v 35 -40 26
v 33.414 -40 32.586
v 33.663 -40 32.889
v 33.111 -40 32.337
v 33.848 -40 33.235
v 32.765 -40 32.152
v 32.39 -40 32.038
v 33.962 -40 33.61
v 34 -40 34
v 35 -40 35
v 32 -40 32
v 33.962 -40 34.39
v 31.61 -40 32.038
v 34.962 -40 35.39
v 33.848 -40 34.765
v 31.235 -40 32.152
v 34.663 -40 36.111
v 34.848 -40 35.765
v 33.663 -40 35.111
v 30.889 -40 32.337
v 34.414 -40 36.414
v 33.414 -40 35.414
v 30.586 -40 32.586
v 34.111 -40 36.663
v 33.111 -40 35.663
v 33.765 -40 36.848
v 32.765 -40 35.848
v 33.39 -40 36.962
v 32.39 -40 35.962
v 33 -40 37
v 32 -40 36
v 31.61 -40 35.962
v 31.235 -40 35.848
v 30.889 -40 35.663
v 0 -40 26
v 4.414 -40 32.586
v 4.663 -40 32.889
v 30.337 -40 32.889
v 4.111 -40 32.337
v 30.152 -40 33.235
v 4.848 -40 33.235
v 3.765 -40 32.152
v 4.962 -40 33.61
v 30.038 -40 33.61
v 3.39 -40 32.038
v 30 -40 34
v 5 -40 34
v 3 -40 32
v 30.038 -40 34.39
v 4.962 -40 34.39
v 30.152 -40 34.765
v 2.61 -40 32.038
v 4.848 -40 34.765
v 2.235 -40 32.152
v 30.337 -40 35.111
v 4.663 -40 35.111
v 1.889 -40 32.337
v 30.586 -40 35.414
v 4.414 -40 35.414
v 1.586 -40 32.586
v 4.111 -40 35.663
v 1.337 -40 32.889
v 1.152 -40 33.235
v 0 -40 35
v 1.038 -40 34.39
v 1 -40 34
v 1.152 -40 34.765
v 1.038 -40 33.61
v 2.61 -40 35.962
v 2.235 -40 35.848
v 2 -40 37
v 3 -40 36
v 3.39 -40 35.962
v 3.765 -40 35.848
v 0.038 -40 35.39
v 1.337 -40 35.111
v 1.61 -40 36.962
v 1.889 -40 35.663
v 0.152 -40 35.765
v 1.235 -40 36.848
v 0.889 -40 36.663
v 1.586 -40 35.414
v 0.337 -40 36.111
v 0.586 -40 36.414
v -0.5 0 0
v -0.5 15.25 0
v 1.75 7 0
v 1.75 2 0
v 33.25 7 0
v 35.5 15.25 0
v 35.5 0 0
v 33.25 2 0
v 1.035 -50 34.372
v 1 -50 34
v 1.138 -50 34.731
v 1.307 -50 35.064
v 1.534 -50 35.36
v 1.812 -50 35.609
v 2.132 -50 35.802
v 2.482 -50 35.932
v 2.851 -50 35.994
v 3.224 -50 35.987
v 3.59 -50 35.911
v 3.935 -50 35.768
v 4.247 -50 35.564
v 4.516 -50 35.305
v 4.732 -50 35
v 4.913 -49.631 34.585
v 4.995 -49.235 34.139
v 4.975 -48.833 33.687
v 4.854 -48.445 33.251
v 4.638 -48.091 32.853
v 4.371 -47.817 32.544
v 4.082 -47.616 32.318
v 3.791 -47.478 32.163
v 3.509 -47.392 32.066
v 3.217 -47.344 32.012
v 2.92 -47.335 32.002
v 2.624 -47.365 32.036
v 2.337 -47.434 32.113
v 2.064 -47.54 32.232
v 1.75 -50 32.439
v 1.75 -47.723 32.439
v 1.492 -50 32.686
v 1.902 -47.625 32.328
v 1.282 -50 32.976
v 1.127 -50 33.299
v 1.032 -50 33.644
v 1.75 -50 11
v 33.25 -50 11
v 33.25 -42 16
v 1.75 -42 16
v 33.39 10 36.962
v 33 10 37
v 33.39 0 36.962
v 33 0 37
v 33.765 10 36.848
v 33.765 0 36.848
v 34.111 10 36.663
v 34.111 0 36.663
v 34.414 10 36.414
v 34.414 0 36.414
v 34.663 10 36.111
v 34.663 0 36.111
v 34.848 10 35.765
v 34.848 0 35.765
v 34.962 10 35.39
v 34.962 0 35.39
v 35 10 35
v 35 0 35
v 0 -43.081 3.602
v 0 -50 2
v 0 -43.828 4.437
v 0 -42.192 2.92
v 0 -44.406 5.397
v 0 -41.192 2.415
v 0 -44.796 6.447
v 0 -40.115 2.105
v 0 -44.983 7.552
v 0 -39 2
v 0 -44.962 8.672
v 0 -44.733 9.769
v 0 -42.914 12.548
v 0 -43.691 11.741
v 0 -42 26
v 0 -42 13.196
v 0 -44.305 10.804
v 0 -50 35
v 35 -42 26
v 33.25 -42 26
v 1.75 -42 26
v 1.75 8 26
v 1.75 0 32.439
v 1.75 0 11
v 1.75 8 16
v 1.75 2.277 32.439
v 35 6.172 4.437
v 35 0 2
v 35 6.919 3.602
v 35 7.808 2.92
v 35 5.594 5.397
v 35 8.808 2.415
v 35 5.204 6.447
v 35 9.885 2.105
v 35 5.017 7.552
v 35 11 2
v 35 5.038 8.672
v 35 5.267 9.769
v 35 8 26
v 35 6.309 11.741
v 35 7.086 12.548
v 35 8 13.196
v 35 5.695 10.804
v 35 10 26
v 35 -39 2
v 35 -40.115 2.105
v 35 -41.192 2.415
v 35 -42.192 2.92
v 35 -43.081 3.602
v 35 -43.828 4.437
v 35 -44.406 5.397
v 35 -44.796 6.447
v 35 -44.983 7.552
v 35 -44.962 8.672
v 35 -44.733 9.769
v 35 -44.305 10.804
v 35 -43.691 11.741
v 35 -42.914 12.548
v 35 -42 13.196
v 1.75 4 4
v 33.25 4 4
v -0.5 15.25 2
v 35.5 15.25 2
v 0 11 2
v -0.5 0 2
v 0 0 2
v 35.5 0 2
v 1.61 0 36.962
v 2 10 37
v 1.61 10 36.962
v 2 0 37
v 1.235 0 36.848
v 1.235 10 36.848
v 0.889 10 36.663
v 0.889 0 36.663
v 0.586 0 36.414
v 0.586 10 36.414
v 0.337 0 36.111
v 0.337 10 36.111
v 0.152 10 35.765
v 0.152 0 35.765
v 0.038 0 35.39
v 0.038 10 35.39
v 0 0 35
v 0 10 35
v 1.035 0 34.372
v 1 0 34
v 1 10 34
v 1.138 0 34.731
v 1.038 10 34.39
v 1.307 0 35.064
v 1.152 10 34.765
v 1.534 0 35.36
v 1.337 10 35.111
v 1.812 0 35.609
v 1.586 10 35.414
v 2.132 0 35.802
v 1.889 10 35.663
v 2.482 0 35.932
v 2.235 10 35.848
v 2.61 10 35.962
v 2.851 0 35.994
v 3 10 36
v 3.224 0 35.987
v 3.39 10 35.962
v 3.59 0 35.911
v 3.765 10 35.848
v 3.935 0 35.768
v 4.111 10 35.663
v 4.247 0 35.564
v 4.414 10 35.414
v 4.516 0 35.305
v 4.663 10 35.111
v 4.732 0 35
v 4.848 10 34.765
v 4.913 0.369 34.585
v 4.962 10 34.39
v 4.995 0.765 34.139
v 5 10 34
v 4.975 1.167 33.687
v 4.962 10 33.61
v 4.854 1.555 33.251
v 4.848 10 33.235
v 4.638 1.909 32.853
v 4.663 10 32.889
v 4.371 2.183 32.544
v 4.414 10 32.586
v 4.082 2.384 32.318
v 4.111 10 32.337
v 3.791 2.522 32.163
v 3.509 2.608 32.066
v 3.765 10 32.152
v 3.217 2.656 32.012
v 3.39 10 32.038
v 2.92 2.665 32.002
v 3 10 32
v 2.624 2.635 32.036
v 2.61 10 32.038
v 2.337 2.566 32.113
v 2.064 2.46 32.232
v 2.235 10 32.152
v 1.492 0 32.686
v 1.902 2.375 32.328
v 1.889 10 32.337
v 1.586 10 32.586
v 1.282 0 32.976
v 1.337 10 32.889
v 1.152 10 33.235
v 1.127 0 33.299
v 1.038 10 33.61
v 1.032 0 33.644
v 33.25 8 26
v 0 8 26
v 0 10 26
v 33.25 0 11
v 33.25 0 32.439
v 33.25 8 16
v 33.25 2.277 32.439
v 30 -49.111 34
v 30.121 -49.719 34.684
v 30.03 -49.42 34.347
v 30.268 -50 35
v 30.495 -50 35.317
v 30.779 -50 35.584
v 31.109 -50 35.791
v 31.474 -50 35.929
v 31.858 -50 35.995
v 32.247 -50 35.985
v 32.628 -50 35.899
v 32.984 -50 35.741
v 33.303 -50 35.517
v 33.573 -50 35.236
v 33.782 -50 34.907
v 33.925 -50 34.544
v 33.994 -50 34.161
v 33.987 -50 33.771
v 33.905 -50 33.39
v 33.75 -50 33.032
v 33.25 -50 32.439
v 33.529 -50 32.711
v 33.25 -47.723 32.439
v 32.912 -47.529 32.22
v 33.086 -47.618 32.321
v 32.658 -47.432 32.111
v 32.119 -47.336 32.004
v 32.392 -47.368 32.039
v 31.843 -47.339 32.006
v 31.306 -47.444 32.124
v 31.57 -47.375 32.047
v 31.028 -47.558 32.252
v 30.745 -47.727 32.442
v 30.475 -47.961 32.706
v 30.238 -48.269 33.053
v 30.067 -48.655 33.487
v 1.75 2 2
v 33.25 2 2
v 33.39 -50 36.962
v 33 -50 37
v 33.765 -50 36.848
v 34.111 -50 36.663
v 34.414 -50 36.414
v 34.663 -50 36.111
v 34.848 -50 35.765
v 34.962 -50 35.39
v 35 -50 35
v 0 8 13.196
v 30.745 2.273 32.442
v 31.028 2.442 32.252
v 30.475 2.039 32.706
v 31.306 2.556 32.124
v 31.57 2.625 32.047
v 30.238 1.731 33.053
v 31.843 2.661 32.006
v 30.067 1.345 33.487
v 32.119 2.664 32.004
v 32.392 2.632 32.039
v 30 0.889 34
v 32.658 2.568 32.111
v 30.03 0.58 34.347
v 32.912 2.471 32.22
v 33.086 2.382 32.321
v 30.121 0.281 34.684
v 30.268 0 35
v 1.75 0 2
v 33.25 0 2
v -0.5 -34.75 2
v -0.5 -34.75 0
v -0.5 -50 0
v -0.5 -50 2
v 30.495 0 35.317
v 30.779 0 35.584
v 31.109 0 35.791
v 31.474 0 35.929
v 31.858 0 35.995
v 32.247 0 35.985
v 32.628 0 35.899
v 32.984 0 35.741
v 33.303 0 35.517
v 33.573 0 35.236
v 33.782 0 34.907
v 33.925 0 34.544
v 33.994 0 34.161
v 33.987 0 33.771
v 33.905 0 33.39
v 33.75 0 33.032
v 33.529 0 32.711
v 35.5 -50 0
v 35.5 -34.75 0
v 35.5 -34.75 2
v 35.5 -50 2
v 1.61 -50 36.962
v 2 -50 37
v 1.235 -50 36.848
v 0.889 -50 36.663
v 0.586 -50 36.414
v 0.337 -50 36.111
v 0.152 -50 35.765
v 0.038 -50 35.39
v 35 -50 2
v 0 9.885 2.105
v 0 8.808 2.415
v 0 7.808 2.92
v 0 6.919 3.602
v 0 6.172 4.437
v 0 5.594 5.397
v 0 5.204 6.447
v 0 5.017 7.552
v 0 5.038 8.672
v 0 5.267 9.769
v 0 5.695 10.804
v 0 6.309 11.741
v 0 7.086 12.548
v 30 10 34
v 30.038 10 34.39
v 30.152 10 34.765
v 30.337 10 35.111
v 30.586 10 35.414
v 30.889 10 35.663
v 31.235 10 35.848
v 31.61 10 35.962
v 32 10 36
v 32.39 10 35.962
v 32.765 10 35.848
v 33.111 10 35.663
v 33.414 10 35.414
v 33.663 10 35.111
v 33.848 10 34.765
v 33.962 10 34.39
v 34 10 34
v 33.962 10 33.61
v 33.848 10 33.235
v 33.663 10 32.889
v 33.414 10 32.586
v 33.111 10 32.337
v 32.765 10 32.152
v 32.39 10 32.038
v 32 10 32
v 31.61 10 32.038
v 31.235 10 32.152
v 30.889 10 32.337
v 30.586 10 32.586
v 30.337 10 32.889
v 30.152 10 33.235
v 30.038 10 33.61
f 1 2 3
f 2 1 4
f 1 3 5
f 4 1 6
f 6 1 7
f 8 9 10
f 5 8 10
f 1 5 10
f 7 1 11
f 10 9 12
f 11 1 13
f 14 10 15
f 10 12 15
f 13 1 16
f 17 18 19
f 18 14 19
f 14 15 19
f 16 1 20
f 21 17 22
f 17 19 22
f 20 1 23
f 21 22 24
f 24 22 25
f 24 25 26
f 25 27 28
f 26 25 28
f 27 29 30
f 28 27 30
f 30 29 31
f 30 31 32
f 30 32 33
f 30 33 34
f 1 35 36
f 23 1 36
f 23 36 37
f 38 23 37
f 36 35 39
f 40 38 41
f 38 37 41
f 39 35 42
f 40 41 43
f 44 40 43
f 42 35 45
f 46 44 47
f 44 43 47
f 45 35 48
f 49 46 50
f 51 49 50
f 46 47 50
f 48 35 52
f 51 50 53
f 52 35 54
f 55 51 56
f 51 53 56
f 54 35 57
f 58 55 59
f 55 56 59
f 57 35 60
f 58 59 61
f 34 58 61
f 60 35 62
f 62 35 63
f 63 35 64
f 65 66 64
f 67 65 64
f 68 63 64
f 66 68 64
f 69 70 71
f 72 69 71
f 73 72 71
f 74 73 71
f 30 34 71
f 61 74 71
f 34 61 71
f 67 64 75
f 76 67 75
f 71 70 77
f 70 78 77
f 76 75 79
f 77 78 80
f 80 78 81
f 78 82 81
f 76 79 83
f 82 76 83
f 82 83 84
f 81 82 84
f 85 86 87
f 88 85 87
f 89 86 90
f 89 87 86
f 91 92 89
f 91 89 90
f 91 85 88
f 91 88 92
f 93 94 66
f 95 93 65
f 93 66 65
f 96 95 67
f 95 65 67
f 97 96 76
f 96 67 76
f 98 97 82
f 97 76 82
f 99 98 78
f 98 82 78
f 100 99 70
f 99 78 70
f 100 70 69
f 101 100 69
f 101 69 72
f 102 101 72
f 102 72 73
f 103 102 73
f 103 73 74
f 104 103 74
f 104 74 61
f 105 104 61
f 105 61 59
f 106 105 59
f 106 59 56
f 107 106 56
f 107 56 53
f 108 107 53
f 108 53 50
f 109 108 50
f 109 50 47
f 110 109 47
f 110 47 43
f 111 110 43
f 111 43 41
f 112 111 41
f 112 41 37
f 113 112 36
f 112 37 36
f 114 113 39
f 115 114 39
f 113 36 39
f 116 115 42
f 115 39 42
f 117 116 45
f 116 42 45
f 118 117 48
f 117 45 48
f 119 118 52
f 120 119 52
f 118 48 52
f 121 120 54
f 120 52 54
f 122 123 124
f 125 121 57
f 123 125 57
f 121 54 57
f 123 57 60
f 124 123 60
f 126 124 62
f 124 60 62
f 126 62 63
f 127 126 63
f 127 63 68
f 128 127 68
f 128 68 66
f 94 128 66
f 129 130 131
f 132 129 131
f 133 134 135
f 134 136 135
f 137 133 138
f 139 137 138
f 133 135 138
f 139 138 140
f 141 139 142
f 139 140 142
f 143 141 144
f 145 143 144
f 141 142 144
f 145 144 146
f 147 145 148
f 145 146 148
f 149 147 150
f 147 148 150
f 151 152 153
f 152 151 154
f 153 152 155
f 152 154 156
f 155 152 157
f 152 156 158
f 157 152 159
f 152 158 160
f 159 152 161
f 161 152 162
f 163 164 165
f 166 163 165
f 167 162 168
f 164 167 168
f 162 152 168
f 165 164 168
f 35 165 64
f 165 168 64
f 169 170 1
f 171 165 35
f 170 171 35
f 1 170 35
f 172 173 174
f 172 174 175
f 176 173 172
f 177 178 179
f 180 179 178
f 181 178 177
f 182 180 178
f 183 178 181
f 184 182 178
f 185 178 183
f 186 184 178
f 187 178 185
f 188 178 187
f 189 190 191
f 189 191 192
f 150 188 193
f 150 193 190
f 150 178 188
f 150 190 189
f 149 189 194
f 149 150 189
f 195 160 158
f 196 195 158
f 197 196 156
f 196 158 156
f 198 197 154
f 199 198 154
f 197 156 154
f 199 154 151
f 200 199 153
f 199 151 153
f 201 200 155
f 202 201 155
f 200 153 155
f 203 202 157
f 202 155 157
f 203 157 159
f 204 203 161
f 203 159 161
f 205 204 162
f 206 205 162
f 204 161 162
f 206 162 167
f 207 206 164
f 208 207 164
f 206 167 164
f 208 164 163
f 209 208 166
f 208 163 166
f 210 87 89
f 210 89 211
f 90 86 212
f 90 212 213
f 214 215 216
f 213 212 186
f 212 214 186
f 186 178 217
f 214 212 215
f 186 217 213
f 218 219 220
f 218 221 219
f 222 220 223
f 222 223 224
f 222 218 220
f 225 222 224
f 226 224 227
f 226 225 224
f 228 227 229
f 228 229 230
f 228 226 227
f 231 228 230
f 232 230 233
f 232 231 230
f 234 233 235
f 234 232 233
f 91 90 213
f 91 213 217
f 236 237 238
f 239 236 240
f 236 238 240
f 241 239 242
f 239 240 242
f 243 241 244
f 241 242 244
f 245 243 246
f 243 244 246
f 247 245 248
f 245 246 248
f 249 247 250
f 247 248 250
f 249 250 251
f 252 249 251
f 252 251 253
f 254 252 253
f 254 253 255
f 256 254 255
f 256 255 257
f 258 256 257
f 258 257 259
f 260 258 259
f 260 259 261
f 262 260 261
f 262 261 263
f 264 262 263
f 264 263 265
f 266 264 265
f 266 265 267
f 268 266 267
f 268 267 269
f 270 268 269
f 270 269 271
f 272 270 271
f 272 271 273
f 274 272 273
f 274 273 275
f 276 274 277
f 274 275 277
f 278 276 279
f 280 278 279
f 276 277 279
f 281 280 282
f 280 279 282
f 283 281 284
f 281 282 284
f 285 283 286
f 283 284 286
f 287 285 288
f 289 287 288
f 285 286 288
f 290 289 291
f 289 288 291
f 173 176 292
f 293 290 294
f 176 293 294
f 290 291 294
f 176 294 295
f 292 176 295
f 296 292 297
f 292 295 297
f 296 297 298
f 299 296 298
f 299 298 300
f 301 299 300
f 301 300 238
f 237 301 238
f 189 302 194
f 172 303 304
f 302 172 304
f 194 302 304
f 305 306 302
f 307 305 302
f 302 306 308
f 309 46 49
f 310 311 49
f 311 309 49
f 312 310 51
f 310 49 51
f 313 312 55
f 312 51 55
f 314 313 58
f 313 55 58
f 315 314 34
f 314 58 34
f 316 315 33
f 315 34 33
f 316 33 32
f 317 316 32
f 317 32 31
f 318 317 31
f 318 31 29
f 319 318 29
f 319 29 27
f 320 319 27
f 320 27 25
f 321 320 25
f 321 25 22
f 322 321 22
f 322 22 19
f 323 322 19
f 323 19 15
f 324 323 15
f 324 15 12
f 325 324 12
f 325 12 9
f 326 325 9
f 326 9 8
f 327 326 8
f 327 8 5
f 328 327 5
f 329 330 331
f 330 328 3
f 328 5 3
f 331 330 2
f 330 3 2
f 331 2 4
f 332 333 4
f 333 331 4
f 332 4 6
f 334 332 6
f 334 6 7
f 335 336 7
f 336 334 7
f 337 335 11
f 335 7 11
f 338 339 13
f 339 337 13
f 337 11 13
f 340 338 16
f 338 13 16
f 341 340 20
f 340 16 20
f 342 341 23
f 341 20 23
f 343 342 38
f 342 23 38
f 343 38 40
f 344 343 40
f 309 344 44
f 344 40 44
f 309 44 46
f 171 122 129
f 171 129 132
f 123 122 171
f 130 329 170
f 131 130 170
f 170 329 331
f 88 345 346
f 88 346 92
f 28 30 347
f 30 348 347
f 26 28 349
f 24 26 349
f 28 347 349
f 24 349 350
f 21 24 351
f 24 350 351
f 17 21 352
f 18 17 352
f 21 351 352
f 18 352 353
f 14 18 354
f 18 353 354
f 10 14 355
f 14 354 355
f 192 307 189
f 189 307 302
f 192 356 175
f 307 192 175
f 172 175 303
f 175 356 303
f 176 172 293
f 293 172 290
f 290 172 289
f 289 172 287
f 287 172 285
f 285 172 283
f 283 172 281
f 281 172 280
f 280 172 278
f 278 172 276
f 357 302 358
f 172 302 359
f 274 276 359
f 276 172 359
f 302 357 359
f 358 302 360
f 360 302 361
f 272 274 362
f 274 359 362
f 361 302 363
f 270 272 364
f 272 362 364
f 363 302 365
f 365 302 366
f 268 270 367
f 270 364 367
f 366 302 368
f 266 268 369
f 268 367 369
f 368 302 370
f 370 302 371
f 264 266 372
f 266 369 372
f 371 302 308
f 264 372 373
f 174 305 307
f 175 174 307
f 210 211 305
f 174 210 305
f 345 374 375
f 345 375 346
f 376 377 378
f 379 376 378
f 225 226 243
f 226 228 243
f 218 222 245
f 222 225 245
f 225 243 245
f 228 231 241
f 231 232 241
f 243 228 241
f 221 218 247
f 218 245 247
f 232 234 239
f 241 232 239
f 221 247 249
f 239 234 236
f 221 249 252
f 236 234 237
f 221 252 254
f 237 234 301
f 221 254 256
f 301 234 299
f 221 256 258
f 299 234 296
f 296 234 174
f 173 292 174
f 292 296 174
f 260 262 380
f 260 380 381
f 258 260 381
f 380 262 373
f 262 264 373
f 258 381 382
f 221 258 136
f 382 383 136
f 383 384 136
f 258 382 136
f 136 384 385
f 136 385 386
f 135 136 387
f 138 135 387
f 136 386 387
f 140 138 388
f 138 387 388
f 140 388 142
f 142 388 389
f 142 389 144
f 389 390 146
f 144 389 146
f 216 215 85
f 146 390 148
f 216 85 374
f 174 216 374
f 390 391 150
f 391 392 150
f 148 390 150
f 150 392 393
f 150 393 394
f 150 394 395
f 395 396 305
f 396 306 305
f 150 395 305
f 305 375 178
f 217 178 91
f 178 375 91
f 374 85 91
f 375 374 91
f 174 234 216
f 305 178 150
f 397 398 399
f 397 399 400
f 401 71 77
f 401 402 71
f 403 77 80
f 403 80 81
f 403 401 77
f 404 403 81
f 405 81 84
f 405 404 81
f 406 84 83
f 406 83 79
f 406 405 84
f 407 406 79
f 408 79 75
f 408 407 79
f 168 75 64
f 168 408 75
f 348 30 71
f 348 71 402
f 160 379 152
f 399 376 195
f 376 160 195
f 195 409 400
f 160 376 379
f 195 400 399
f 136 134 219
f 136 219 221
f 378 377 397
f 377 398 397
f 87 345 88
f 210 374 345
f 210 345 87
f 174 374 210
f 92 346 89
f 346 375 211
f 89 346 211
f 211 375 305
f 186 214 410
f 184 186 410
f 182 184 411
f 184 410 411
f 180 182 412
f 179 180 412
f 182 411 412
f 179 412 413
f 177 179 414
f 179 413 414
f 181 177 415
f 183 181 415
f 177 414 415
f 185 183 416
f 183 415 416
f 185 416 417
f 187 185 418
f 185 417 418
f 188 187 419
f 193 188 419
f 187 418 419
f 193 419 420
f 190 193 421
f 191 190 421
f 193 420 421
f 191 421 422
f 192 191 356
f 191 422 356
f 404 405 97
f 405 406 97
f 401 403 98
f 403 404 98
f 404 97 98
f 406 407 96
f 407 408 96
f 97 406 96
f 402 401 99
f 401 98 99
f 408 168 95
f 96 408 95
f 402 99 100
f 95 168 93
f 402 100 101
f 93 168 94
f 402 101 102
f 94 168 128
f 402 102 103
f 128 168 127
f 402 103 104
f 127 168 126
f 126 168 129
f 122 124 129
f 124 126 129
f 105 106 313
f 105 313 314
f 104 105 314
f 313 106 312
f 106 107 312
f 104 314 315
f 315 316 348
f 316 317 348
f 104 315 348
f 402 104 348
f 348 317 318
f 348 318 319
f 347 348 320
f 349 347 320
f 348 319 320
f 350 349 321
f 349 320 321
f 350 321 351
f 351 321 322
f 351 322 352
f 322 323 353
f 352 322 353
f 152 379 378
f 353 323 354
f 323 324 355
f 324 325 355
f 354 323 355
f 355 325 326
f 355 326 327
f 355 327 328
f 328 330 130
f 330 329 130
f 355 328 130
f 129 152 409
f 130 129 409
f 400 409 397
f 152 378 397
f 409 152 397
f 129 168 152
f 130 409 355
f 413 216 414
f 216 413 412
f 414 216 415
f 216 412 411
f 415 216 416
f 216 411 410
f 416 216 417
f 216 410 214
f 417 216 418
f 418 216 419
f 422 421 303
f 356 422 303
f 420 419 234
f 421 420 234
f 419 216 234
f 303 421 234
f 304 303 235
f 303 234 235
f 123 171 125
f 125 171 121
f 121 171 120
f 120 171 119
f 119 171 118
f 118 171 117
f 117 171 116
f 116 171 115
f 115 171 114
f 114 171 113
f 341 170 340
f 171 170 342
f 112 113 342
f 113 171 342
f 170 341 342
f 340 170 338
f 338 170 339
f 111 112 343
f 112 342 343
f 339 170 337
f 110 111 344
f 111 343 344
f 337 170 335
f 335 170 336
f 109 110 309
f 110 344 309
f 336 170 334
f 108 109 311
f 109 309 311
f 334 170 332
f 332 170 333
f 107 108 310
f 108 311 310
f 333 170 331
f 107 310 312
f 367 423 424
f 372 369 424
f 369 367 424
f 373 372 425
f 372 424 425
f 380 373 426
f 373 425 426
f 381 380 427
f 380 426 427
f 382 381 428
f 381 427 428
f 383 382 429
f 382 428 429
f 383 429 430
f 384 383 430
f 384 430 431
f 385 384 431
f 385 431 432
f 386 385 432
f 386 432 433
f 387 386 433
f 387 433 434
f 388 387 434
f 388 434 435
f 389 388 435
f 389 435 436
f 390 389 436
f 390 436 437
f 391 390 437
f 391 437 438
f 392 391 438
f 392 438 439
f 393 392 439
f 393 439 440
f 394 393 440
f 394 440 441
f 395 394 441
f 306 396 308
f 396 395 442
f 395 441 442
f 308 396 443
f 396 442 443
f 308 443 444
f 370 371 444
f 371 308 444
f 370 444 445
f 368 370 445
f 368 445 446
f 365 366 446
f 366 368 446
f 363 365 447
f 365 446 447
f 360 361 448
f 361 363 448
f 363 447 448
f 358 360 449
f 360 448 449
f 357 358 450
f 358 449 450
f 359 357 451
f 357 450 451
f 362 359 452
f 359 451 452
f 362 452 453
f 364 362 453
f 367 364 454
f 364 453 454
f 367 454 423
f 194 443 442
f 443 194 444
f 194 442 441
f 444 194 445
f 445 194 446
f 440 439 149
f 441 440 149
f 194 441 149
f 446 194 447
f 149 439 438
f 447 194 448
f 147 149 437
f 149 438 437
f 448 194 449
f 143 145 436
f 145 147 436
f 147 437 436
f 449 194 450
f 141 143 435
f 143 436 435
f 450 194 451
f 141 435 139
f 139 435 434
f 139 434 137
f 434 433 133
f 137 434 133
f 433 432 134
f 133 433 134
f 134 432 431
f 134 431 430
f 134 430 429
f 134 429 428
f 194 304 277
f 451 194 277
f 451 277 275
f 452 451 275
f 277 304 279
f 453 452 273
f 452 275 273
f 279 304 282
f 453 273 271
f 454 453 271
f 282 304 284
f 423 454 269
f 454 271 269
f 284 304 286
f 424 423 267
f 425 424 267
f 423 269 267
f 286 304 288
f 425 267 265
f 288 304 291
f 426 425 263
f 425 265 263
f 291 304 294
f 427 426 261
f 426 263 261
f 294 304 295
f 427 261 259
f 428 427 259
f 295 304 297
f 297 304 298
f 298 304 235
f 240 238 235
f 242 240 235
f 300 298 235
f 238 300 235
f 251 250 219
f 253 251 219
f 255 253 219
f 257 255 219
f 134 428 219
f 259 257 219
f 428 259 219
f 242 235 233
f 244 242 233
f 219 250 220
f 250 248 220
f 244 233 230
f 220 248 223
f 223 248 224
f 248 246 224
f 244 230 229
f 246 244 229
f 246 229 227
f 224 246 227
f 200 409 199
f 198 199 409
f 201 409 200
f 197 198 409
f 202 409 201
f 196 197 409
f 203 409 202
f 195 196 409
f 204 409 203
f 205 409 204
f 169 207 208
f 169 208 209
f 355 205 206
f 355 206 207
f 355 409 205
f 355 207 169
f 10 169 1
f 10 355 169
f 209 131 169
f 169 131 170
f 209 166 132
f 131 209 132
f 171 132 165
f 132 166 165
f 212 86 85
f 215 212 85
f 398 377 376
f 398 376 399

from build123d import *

# Parameters (mm, degrees)
F1_DEPTH      = 35
F2_R          = 2
F3_DEPTH      = 10
F4_R          = 2
F7_DEPTH      = 15.75
F7_DEPTH_BACK = 15.75
F8_W          = 36
F8_H          = 15.25
F8_W_2        = 31.5
F8_H_2        = 5
F9_DEPTH      = 2
F12_DEPTH     = 31.5


with BuildPart() as f1:
    # F0 (on Right) → F1 (new body)
    with BuildSketch(Plane.YZ):
        with BuildLine():
            Line((0, 37), (0, 0))
            Line((0, 0), (15.25, 0))
            Line((15.25, 0), (15.25, 2))
            Line((15.25, 2), (11, 2))
            ThreePointArc((11, 2), (5.2044450423, 6.4470857294), (8, 13.1961524227))
            Line((8, 13.1961524227), (8, 26))
            Line((8, 26), (10, 26))
            Line((10, 26), (10, 37))
            Line((10, 37), (0, 37))
        make_face()
    extrude(amount=F1_DEPTH)

    # F2 (on face) → F3 (cut, through all)
    with BuildSketch(Plane(origin=(0, 10, 0), x_dir=(-1, 0, 0), z_dir=(0, 1, 0))):
        with Locations((-32, 34)):
            Circle(F2_R)
        with Locations((-3, 34)):
            Circle(F2_R)
    extrude(amount=-F3_DEPTH, mode=Mode.SUBTRACT)

    # F4
    f4_edges = [f1.edges().sort_by_distance(p)[0] for p in [
        (0, 5, 37),
        (35, 5, 37),
    ]]
    fillet(f4_edges, radius=F4_R)

    # F6 (on offset) → F7 (cut, two sides)
    with BuildSketch(Plane.YZ.offset(17.5)) as f7_sk:
        Polygon((4, 4), (0, 11), (0, 2), (2, 2), (2, 0), (7, 0), align=None)
        Polygon((8, 26), (0, 35), (0, 11), (8, 16), align=None)
    extrude(amount=F7_DEPTH, mode=Mode.SUBTRACT)
    extrude(f7_sk.sketch, amount=-F7_DEPTH_BACK, mode=Mode.SUBTRACT)

    # F8 (on face) → F9 (join)
    with BuildSketch(Plane(origin=(0, 0, 0), x_dir=(1, 0, 0), z_dir=(0, 0, -1))):
        with Locations((17.5, -7.625)):
            Rectangle(F8_W, F8_H)
        with Locations((17.5, -4.5)):
            Rectangle(F8_W_2, F8_H_2, mode=Mode.SUBTRACT)
    extrude(amount=-F9_DEPTH)


with BuildPart() as f10_1:
    # F10: copy of F1
    add(f1.part.moved(Location((0, -50, 0))))

    # F11 (on face) → F12 (join, through all)
    with BuildSketch(Plane(origin=(33.25, 0, 0), x_dir=(0, -1, 0), z_dir=(-1, 0, 0))):
        Polygon((50, 11), (46, 4), (43, 0), (48, 0), (48, 2), (50, 2), align=None)
    extrude(amount=F12_DEPTH)


solid = Compound([f1.part, f10_1.part])
